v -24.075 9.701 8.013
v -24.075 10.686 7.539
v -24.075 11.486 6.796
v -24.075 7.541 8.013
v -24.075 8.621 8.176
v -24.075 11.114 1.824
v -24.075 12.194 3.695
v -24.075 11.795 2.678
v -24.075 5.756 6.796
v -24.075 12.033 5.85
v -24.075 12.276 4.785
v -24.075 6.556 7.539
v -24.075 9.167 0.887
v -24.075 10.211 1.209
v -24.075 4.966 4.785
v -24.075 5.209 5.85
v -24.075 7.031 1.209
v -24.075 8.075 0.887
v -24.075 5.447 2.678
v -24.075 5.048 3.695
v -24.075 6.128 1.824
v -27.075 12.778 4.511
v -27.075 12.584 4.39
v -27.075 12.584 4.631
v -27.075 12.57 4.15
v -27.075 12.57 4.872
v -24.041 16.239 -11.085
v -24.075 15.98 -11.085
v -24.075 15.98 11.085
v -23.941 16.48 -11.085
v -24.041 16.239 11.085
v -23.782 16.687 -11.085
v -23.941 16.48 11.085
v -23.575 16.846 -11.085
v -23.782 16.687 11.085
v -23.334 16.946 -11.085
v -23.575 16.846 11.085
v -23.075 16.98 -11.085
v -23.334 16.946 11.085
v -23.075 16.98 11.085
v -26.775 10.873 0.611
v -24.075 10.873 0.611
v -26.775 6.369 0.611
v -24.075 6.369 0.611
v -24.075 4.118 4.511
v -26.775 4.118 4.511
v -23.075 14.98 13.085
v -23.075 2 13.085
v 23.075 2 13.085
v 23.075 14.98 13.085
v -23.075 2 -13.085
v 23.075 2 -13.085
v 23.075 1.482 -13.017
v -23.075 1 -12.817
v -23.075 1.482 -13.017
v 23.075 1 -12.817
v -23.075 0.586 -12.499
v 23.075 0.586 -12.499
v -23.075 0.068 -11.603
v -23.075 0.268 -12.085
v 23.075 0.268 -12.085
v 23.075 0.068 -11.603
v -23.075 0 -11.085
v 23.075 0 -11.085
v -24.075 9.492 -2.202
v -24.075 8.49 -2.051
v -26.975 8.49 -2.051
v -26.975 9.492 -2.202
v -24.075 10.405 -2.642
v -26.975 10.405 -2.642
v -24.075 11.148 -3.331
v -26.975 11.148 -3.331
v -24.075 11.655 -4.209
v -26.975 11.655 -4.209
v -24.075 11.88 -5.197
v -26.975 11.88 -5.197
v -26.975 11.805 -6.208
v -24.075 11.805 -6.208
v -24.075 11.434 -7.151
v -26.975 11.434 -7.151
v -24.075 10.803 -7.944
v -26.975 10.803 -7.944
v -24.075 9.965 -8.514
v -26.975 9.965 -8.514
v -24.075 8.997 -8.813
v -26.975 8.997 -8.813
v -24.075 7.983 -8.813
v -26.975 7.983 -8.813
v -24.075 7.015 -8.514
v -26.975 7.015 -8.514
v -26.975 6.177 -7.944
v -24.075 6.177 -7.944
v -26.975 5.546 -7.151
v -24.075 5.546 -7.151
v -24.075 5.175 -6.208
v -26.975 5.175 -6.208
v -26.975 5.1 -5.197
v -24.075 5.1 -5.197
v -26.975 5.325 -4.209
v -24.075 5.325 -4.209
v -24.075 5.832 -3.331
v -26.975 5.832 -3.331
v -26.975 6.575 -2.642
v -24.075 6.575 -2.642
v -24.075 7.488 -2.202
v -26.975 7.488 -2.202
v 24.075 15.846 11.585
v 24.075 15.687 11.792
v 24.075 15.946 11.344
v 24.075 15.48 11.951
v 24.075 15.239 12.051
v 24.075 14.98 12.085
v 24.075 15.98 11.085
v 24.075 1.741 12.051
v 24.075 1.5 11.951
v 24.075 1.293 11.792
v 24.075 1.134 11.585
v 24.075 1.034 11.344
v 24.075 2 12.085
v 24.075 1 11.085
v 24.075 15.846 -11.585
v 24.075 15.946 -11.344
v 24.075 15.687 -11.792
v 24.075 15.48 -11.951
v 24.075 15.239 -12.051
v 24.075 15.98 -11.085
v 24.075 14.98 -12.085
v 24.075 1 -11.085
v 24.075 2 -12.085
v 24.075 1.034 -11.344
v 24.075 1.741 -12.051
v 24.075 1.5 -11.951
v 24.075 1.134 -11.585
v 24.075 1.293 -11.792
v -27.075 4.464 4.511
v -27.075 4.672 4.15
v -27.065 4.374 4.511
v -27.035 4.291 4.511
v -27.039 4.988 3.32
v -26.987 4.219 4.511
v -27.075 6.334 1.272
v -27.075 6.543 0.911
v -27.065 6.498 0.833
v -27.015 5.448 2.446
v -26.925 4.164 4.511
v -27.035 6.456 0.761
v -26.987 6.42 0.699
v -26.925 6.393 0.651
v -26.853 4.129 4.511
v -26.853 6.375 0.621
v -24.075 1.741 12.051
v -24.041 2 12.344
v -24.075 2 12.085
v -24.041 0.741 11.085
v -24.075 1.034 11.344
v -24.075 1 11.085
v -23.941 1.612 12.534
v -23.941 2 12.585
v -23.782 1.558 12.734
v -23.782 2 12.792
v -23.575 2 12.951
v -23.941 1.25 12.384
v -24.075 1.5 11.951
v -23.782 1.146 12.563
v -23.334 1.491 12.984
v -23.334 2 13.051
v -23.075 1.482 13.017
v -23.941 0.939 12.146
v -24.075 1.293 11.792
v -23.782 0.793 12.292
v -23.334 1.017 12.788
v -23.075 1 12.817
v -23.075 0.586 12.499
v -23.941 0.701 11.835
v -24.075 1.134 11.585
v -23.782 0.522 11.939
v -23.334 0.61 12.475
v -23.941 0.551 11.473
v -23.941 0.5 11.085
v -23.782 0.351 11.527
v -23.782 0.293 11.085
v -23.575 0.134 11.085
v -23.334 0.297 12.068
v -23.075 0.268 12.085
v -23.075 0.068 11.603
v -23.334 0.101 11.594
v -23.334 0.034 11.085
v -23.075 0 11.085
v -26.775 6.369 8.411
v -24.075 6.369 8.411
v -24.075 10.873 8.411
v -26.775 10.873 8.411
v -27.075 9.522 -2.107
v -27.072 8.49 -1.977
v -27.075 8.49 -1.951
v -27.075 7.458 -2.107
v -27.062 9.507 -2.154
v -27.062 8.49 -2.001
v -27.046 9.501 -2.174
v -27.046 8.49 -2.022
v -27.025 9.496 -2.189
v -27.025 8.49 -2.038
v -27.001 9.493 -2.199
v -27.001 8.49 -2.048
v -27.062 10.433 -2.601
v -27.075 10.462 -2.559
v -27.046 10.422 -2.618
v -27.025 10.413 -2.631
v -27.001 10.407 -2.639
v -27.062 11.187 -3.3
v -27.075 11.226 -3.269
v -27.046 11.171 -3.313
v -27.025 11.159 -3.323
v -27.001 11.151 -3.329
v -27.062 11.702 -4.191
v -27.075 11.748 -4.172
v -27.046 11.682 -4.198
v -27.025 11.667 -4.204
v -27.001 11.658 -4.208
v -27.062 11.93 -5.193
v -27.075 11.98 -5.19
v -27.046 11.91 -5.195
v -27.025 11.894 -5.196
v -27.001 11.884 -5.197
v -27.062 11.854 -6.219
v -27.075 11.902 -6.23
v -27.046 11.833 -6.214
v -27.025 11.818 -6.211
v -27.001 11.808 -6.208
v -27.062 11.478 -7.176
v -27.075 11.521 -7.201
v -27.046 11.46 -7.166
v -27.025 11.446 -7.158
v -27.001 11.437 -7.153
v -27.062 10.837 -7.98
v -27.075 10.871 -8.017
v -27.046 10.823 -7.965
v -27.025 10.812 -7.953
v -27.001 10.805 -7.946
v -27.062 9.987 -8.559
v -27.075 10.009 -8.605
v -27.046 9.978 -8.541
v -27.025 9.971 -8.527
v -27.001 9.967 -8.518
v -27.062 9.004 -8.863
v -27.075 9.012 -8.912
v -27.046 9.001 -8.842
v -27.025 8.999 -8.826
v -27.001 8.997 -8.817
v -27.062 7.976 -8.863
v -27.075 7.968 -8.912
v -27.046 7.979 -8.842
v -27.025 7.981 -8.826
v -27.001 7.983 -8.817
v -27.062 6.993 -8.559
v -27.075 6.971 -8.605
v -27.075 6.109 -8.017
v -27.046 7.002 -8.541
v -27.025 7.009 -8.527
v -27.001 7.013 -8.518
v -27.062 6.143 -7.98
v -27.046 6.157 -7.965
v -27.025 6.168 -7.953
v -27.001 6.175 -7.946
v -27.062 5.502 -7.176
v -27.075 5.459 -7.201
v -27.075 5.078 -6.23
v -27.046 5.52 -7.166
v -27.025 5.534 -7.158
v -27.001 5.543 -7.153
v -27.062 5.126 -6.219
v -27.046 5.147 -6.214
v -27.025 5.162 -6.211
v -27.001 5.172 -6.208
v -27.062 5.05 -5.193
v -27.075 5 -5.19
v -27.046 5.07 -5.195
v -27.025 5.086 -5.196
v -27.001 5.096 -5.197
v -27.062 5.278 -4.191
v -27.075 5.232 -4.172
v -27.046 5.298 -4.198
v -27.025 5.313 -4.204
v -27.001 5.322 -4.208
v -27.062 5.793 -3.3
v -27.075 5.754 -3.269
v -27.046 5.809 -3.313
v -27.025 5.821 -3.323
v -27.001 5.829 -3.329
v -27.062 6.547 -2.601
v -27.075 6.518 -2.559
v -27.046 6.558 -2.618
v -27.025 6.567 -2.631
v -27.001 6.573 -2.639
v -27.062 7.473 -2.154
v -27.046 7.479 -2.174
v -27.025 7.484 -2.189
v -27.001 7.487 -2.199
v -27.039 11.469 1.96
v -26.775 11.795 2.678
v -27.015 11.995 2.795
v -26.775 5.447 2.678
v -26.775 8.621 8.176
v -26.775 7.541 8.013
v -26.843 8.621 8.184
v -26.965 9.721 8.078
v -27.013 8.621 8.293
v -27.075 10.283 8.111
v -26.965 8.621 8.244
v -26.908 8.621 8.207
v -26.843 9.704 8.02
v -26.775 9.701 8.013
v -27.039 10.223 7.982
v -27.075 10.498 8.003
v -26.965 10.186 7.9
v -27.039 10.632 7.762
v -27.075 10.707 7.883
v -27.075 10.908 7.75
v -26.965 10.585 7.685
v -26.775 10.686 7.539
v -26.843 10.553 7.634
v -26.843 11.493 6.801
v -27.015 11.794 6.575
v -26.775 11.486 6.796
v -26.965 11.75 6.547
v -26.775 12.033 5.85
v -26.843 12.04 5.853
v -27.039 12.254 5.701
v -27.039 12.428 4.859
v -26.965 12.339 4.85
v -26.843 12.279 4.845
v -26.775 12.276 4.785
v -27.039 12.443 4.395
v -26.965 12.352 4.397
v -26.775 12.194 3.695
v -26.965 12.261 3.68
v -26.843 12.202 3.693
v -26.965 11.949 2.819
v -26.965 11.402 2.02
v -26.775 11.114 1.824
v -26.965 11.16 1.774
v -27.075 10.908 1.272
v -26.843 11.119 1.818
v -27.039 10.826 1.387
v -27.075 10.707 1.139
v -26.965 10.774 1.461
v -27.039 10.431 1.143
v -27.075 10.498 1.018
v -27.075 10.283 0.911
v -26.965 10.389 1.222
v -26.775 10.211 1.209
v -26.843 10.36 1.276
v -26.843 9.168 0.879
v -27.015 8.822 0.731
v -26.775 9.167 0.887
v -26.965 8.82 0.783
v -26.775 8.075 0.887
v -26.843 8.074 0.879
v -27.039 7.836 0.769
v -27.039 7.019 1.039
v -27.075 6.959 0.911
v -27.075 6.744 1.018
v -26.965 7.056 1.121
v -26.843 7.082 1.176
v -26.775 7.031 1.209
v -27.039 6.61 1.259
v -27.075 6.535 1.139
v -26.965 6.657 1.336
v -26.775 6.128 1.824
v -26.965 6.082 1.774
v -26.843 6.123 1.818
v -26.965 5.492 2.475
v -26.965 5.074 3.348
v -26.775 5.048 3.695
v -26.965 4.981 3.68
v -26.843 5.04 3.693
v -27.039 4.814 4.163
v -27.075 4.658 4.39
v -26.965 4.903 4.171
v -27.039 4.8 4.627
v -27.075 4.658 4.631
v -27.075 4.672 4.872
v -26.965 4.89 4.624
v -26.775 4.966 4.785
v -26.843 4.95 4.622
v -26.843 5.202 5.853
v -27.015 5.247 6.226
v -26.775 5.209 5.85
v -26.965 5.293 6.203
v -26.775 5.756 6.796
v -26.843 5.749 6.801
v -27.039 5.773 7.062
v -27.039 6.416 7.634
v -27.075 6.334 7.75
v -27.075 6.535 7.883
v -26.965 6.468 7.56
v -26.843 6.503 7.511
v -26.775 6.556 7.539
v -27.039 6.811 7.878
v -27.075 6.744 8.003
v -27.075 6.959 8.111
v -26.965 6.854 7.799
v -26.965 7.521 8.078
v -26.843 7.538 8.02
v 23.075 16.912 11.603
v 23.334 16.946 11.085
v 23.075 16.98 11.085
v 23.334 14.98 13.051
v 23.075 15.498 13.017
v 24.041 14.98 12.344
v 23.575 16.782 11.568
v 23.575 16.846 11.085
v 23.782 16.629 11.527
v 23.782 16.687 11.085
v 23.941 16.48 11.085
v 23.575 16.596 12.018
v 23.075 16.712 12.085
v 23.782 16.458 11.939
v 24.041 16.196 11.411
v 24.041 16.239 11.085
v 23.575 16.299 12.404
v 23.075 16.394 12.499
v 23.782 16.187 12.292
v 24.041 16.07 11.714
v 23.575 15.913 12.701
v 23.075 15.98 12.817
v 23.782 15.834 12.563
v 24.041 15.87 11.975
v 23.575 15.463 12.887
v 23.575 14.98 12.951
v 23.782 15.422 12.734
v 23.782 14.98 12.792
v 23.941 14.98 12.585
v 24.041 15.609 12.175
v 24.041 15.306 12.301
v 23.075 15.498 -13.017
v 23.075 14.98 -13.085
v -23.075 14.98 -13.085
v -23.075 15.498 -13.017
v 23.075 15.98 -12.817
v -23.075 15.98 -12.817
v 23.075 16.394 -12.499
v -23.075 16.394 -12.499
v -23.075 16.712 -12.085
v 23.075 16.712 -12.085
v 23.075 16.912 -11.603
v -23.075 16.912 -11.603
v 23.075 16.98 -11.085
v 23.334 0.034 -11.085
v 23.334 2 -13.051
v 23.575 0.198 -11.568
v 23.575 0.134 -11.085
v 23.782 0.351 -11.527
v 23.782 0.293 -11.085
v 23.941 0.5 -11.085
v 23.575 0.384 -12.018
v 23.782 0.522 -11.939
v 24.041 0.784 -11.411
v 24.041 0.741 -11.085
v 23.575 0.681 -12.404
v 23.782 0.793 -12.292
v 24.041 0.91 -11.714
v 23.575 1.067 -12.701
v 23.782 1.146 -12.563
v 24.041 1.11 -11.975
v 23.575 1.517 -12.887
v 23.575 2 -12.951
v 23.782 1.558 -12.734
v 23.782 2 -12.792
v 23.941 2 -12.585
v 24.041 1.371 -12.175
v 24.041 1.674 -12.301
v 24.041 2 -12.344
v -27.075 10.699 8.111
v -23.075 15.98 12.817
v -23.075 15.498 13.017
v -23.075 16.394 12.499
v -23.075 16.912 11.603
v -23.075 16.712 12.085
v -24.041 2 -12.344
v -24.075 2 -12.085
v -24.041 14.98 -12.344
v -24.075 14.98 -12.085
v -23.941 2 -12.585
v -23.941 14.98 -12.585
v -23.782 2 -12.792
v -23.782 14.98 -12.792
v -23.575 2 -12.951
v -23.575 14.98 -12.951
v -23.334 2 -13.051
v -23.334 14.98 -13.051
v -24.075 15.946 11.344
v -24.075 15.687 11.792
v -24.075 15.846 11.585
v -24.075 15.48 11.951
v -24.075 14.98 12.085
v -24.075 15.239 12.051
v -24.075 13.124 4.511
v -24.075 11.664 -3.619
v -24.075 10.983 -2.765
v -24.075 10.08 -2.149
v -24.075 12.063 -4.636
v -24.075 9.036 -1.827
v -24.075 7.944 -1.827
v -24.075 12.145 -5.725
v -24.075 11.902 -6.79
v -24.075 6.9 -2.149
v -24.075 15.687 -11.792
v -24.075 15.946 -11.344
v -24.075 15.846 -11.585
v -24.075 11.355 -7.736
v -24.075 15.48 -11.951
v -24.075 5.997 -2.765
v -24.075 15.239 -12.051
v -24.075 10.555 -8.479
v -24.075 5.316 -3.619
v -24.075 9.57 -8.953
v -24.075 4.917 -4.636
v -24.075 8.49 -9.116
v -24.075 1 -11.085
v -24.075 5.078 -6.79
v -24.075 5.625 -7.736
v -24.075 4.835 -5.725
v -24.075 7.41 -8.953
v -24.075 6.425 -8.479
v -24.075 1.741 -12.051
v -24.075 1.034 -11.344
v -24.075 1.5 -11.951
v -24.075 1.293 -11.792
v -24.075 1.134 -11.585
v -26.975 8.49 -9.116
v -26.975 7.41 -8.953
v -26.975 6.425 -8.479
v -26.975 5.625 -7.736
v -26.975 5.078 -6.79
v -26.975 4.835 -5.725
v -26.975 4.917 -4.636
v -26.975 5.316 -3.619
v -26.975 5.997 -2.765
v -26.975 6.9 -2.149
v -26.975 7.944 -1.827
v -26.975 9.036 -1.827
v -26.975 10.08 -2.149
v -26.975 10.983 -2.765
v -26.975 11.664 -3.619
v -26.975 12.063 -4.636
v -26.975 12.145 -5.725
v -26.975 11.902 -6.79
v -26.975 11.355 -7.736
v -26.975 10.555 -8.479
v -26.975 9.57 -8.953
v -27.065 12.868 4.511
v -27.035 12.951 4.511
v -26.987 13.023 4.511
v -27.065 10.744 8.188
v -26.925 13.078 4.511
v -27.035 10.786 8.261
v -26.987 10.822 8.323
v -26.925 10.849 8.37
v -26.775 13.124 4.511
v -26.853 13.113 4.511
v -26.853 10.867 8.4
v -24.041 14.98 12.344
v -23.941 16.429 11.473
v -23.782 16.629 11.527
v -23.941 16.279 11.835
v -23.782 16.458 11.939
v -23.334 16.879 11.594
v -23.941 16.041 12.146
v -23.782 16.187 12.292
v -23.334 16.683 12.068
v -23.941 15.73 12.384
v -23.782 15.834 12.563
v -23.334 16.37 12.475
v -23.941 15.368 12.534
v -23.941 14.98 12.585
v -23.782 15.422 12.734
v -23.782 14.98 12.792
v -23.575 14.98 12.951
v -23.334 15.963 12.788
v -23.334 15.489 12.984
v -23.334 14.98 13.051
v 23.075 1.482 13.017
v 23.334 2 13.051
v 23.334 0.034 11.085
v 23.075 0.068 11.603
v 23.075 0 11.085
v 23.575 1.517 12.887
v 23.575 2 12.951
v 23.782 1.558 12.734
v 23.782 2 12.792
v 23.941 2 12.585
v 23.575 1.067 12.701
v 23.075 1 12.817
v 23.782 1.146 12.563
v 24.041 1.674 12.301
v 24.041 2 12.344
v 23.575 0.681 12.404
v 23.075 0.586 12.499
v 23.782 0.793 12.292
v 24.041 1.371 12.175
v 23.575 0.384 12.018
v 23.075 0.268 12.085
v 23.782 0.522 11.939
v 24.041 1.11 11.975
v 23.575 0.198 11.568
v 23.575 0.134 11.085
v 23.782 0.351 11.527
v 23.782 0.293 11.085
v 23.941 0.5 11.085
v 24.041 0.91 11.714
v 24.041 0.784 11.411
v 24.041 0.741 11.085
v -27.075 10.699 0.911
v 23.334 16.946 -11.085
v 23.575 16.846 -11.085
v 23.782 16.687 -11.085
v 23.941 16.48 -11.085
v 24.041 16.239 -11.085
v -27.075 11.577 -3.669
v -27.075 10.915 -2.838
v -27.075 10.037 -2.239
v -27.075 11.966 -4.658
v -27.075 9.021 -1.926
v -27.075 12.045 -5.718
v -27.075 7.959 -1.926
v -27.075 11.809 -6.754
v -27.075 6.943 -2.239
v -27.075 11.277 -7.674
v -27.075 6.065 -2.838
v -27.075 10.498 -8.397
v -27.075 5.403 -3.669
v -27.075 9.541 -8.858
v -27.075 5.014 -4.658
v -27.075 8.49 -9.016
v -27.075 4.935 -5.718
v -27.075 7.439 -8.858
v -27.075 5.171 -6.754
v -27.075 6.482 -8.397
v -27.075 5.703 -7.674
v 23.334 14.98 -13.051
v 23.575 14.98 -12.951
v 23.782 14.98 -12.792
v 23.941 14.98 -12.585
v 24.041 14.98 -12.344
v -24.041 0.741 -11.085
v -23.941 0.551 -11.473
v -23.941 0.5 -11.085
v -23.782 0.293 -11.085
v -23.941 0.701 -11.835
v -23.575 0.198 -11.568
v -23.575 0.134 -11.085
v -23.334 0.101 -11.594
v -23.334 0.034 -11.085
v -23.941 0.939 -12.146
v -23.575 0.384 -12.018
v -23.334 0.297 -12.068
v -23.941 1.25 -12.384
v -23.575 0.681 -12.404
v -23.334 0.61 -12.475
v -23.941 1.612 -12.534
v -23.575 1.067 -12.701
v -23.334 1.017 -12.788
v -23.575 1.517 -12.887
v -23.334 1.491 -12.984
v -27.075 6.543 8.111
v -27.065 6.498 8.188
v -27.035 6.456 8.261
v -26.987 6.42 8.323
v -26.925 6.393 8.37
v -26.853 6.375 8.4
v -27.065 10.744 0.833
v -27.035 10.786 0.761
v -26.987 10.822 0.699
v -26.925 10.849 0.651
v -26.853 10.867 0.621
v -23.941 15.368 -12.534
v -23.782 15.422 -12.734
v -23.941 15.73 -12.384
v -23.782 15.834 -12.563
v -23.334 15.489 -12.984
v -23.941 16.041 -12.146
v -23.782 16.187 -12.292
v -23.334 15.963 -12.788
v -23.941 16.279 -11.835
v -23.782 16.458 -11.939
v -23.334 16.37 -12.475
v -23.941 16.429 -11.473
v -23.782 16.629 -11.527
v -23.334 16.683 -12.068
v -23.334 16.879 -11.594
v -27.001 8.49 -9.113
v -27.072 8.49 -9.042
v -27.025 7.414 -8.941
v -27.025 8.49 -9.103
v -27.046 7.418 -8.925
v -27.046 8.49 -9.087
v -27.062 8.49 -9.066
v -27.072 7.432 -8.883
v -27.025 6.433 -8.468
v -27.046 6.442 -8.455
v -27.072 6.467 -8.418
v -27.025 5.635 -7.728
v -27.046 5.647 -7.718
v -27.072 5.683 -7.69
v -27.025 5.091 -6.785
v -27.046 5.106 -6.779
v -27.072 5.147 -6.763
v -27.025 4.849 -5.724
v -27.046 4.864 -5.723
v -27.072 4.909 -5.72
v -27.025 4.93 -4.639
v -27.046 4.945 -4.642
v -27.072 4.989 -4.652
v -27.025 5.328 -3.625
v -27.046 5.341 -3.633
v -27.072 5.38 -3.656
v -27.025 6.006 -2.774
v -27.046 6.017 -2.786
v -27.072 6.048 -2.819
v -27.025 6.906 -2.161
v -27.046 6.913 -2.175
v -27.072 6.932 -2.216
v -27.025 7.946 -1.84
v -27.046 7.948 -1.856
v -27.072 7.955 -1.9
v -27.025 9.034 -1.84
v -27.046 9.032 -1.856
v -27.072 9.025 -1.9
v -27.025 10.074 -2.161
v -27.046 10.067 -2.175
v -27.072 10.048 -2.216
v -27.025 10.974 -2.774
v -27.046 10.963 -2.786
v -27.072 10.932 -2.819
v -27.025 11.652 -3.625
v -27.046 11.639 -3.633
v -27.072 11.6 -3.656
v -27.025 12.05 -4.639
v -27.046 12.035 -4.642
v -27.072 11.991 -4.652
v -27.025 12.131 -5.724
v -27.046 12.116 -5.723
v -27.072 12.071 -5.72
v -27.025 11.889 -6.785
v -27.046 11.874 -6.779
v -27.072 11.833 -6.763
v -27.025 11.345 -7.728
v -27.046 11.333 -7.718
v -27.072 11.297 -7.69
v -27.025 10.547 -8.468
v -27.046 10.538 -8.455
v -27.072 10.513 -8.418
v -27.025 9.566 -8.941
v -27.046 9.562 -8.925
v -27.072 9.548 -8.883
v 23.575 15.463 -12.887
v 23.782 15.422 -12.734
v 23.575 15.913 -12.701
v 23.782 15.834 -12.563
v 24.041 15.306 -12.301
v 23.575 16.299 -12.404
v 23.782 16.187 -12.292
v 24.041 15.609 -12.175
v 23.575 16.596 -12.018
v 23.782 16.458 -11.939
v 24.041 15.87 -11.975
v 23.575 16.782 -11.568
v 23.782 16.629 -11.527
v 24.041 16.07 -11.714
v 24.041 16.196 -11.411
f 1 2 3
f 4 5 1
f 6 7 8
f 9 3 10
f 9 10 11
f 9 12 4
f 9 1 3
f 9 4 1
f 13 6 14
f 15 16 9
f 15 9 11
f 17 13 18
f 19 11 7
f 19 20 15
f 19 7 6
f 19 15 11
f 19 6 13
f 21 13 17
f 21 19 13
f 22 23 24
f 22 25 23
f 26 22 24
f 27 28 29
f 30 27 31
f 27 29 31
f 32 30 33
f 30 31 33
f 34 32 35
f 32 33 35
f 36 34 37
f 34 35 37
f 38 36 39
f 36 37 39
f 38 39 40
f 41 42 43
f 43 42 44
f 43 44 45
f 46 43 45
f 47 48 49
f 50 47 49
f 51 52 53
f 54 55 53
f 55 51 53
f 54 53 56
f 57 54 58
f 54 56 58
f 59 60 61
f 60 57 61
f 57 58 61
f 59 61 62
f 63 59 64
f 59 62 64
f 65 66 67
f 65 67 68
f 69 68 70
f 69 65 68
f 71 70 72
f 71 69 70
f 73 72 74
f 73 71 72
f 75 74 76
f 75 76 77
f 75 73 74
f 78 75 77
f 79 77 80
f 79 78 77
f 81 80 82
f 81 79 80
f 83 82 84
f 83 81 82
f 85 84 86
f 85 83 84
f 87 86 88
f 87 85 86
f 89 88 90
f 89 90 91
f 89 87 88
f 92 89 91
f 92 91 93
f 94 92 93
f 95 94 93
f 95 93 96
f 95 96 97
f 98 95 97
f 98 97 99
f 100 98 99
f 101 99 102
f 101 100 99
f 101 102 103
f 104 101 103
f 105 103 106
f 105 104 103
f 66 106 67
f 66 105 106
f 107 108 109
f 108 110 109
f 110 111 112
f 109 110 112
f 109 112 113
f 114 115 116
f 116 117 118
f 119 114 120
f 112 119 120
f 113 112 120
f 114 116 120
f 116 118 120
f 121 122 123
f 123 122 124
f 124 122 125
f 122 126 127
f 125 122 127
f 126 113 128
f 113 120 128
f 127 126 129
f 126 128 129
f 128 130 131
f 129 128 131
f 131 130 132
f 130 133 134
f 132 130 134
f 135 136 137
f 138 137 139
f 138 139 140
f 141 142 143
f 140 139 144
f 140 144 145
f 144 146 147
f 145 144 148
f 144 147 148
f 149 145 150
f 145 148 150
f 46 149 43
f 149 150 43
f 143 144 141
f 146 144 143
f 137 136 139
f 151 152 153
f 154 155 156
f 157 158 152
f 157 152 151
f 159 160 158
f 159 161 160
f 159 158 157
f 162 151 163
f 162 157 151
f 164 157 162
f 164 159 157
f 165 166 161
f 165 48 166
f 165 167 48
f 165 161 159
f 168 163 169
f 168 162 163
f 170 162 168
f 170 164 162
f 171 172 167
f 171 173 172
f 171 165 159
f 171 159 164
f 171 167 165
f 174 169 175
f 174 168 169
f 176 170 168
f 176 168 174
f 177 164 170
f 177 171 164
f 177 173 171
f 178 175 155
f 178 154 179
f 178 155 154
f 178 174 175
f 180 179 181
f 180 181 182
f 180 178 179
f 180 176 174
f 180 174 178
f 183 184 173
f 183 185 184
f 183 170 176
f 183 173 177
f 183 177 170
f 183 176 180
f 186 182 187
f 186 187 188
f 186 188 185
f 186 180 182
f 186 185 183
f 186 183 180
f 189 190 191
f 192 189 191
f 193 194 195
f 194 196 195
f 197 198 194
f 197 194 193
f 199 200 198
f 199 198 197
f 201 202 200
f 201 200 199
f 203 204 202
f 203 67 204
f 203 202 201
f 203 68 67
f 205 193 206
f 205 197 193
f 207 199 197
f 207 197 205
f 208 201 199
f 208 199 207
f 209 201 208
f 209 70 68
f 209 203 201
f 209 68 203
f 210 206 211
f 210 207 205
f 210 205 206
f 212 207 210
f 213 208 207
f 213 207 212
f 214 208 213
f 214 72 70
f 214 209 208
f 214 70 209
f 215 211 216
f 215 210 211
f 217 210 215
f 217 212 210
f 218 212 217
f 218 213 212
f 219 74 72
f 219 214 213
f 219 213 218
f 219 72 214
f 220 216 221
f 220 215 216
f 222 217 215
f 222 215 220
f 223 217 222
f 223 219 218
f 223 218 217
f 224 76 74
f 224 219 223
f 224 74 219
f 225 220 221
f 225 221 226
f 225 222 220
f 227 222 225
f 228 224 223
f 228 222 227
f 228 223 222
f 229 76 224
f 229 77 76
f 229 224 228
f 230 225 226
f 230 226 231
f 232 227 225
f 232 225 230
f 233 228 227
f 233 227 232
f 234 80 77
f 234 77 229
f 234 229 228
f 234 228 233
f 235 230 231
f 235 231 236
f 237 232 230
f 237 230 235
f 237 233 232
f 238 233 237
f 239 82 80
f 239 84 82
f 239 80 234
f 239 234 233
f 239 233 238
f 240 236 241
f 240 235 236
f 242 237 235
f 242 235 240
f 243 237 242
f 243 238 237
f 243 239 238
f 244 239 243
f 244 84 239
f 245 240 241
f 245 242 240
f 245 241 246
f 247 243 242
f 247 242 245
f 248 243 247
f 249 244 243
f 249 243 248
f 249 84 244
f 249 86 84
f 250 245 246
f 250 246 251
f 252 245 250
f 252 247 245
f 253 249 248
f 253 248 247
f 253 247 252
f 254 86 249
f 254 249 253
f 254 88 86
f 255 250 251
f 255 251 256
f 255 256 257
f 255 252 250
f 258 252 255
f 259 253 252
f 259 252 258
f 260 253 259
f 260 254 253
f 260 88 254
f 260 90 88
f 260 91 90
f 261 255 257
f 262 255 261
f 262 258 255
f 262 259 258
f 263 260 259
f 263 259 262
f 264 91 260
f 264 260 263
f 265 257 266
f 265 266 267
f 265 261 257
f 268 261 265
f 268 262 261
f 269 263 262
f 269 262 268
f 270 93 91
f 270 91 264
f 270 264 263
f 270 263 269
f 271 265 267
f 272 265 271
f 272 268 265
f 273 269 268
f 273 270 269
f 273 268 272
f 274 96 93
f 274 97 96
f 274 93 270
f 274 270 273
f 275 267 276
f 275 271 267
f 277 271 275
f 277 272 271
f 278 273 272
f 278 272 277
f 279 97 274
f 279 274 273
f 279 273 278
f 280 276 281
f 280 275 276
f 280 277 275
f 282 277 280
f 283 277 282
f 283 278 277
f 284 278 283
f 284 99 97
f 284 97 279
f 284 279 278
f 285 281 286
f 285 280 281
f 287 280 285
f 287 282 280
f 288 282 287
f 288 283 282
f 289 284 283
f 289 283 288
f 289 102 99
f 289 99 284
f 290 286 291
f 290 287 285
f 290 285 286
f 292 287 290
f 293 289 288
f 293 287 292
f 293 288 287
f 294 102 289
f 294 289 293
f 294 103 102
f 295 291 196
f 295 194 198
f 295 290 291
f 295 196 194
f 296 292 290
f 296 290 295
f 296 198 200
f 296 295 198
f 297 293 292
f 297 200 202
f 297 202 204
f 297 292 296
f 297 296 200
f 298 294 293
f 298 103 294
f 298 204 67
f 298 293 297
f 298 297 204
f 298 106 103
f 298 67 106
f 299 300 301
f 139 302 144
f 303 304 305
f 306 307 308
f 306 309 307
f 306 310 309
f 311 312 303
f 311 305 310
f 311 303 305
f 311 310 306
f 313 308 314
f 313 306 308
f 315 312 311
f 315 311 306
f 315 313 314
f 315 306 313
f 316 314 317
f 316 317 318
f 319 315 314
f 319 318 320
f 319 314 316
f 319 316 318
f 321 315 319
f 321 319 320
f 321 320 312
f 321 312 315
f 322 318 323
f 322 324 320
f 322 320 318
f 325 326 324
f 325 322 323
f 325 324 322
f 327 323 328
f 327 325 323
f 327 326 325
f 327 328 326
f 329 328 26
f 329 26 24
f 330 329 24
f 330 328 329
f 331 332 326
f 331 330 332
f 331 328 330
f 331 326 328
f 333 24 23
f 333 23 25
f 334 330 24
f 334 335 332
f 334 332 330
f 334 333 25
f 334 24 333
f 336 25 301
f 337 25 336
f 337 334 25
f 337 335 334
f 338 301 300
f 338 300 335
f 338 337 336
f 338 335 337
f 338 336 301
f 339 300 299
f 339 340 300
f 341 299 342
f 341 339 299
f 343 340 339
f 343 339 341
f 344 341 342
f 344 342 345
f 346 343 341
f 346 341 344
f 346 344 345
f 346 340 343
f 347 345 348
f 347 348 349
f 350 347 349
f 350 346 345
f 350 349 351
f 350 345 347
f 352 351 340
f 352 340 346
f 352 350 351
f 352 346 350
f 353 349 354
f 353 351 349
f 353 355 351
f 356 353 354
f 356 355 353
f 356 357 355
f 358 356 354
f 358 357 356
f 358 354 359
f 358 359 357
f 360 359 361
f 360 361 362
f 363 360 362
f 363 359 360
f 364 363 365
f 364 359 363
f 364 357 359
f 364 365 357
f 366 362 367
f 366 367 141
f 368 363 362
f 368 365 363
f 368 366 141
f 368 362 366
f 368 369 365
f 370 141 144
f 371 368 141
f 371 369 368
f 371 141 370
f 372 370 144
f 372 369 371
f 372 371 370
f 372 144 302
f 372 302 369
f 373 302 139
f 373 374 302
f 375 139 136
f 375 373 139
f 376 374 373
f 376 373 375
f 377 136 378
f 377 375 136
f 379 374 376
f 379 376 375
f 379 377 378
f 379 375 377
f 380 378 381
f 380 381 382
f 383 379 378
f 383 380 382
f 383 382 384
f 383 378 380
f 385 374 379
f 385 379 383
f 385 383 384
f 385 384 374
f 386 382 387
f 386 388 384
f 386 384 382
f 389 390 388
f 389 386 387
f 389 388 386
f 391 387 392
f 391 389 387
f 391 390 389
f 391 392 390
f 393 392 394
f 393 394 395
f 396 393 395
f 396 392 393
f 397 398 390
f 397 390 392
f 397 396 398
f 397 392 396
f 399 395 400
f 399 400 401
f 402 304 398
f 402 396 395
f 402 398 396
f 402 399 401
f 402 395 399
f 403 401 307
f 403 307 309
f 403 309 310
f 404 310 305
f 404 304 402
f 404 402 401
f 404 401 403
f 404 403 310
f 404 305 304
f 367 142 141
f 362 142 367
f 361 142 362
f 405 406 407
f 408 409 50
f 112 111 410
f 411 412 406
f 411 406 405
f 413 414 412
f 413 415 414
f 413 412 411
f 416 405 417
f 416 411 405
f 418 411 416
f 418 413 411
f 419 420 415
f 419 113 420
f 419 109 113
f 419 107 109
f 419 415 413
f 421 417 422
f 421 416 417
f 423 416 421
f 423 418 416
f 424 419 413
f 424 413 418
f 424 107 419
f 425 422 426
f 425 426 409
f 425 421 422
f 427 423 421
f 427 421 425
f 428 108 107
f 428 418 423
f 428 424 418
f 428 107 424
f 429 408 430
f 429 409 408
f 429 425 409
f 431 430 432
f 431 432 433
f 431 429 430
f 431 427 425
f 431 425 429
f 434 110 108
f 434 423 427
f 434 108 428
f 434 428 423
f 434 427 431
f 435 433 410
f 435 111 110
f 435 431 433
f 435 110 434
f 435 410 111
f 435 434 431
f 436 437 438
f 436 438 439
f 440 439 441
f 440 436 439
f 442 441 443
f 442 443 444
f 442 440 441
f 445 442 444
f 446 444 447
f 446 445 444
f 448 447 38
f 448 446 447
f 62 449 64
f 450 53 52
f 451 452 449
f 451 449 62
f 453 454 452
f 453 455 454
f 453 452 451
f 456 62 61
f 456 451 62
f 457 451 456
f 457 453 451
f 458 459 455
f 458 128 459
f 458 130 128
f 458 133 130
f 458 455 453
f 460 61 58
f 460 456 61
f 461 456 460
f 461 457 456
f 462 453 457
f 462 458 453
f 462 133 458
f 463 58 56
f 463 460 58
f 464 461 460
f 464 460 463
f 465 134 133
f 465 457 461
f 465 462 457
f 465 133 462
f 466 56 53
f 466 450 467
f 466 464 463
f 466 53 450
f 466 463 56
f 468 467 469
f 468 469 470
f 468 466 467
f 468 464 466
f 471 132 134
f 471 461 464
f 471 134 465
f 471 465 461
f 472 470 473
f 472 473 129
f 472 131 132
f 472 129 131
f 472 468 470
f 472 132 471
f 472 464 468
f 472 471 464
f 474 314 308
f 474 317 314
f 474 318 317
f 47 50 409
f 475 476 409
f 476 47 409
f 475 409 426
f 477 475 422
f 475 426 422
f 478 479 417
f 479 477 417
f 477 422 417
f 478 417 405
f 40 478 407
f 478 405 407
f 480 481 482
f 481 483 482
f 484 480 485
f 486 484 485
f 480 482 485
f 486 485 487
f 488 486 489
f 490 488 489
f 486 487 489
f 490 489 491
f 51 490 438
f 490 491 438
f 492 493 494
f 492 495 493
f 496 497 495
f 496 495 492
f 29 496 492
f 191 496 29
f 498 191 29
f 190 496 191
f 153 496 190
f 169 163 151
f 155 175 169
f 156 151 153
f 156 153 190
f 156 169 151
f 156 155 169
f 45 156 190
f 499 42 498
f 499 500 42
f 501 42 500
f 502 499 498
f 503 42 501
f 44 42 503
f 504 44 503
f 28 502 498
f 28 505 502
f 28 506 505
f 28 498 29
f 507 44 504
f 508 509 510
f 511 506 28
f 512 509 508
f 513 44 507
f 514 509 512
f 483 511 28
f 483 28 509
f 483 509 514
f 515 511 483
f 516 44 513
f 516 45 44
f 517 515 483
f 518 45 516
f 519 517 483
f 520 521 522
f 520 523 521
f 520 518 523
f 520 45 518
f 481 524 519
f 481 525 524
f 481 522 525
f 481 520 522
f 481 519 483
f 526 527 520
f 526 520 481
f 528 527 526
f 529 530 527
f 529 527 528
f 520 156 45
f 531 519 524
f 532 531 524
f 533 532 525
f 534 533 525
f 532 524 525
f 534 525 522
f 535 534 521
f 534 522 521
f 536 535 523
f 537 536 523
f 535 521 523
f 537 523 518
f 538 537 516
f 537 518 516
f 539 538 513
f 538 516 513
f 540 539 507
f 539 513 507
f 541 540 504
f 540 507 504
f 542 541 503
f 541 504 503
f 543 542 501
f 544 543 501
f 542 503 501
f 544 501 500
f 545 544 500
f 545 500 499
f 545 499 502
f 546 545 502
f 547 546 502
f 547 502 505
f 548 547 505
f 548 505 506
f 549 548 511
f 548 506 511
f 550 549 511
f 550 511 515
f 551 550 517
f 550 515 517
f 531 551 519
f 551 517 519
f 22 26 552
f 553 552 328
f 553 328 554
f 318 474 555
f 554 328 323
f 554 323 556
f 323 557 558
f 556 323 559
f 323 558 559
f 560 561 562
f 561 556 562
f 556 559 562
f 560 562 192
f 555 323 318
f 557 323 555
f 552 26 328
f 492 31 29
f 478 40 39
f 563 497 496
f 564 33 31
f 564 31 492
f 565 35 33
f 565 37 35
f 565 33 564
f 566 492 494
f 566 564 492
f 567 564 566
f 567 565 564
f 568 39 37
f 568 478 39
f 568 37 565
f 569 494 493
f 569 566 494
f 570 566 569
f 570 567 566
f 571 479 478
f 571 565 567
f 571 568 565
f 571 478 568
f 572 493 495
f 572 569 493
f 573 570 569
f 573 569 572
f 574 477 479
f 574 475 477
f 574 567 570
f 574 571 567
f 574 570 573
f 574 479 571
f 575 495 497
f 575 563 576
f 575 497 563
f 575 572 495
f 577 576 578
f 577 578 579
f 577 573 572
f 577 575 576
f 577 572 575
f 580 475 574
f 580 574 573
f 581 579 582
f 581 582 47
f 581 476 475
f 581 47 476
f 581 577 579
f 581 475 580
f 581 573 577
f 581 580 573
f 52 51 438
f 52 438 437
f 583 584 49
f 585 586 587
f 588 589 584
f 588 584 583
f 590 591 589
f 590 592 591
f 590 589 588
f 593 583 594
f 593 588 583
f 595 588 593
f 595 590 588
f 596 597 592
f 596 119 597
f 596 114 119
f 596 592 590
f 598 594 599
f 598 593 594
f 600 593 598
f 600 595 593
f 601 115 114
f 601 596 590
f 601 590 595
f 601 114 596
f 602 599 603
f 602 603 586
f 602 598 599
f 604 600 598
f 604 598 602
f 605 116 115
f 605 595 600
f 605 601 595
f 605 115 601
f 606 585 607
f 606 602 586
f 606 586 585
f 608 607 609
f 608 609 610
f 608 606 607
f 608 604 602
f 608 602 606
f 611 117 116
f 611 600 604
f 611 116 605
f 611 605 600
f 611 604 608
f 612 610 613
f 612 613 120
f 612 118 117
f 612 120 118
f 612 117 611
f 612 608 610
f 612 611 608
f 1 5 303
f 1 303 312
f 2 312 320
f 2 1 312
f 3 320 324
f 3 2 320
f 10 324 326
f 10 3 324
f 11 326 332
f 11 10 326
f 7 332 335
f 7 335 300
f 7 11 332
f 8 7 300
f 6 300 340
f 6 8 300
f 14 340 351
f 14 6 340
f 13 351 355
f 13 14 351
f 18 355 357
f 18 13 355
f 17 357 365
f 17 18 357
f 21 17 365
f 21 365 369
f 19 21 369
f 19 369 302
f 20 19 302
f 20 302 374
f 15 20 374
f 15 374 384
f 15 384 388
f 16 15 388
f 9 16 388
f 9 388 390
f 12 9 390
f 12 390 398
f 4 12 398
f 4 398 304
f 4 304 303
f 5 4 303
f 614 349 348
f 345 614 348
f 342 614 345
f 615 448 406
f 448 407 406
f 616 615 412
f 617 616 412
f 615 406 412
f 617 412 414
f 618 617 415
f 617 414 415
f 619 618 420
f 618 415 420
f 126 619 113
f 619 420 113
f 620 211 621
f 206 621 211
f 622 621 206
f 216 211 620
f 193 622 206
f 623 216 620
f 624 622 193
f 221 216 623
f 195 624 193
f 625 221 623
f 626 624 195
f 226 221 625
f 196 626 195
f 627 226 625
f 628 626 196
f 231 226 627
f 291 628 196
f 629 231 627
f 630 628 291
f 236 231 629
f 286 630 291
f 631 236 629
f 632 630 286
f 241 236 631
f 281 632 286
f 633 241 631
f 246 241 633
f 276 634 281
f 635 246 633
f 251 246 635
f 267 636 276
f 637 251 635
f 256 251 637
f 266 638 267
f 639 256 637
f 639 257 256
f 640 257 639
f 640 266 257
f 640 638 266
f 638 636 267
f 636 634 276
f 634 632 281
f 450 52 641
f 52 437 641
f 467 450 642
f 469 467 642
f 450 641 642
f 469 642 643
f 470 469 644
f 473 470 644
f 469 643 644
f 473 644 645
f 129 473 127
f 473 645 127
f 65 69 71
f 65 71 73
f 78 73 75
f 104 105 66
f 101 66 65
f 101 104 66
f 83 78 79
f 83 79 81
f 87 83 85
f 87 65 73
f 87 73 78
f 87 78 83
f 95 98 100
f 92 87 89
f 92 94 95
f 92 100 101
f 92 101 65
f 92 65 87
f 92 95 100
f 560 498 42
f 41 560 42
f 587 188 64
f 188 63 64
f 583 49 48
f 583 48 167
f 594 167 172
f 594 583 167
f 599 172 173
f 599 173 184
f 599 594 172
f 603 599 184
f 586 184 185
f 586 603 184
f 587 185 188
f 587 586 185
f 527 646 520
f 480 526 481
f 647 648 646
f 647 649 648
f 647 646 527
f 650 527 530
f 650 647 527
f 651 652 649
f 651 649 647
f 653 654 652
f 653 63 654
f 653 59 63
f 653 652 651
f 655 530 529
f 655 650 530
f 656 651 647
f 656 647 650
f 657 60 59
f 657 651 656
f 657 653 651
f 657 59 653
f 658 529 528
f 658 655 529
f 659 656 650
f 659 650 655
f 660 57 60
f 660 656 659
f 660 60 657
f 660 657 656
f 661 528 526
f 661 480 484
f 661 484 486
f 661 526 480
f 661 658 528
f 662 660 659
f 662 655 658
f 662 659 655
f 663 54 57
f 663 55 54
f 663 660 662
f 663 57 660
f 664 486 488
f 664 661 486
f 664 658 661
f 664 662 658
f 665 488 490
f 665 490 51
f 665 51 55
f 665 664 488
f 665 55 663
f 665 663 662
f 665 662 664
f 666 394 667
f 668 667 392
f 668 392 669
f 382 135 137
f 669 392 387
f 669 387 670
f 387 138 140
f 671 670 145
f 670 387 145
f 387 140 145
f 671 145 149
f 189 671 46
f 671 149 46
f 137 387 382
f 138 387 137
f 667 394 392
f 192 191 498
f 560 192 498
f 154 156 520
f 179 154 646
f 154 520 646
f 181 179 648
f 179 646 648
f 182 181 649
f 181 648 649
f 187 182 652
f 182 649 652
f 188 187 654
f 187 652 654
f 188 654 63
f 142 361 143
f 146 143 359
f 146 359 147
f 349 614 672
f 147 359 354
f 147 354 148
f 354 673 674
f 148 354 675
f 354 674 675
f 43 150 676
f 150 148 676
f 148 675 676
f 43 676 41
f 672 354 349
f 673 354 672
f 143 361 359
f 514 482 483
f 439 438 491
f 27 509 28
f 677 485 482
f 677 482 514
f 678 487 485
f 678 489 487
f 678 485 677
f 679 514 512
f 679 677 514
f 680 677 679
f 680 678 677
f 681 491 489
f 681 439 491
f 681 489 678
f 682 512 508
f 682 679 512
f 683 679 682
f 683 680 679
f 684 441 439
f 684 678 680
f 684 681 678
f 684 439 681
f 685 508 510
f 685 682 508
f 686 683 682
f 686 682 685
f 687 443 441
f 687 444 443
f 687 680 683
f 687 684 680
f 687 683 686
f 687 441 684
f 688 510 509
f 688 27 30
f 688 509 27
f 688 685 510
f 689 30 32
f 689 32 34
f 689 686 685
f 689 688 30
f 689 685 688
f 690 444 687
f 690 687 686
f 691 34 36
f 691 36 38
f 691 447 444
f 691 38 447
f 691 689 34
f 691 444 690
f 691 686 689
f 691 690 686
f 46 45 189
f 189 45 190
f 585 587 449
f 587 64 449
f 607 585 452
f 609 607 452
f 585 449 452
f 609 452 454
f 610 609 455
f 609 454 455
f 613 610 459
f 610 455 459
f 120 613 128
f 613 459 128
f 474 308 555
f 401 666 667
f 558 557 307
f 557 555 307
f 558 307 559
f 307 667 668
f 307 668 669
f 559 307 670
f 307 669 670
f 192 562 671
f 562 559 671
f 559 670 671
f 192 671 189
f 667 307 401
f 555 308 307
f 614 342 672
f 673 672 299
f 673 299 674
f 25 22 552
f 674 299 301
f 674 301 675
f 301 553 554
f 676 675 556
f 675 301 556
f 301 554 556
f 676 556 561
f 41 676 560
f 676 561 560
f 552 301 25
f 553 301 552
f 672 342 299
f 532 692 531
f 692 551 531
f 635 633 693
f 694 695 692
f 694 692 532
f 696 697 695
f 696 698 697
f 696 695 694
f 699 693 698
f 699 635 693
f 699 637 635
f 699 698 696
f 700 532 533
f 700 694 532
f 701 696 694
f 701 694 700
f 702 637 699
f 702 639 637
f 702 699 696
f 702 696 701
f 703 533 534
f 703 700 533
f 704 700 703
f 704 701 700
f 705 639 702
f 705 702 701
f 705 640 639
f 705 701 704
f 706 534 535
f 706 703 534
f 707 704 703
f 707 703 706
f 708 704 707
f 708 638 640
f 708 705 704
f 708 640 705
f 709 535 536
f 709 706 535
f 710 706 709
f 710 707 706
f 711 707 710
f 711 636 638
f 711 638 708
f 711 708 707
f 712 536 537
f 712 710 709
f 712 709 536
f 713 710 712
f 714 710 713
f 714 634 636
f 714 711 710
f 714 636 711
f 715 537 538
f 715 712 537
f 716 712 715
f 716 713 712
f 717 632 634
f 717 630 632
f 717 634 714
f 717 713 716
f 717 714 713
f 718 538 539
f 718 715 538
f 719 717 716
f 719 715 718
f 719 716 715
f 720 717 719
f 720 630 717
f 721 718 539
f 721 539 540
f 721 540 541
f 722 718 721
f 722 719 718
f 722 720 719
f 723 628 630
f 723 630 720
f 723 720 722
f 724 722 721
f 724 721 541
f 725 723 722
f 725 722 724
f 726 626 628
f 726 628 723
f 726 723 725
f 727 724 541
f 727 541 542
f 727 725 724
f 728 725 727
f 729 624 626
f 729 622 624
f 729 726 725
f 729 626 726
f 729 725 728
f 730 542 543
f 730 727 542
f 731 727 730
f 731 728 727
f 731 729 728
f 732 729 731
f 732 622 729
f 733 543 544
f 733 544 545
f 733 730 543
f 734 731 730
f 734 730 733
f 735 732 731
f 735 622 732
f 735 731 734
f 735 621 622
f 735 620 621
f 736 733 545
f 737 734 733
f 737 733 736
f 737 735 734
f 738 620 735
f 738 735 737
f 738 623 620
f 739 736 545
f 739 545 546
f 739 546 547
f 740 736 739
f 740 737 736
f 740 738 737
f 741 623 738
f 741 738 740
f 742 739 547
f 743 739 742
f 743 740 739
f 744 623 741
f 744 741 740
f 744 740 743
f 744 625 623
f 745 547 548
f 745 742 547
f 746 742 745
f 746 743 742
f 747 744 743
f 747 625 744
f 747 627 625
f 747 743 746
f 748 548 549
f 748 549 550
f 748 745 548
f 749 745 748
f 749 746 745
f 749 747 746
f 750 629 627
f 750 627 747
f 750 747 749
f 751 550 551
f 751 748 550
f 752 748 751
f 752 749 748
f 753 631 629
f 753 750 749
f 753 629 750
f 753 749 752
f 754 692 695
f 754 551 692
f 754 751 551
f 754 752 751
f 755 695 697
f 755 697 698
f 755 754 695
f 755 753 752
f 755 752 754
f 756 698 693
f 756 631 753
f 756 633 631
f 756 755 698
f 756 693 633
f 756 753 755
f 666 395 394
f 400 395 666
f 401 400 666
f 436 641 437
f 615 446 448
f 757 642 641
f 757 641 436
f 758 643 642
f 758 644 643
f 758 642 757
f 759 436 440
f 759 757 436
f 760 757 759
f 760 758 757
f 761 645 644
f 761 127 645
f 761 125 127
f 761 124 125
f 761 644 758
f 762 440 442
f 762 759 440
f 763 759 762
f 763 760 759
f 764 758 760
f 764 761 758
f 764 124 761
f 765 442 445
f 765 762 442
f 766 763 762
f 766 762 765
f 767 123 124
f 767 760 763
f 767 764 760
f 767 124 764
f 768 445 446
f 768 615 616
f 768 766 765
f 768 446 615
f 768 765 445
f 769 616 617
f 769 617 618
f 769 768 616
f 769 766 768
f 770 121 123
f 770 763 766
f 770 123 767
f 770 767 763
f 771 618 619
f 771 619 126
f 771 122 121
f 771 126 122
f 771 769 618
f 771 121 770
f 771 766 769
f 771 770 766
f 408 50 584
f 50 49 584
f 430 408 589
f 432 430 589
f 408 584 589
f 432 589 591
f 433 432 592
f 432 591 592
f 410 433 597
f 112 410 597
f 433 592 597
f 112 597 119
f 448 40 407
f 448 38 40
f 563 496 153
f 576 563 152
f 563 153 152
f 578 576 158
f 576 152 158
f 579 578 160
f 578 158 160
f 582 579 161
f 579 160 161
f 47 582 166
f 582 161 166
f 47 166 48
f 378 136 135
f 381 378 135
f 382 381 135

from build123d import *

# Parameters (mm, degrees)
SKETCH1_W           = 48.15
SKETCH1_H           = 26.17
BOSS_EXTRUDE1_DEPTH = 16.98
FILLET1_R           = 2
FILLET2_R           = 1
SKETCH2_R           = 3.665
SKETCH2_R_2         = 3.4
BOSS_EXTRUDE2_DEPTH = 3
FILLET6_R           = 0.3
FILLET10_R          = 0.1


with BuildPart() as part:
    # Sketch1 → Boss-Extrude1 (new body)
    with BuildSketch(Plane(origin=(0, 0, 0), x_dir=(1, 0, 0), z_dir=(0, 1, 0))):
        Rectangle(SKETCH1_W, SKETCH1_H)
    extrude(amount=BOSS_EXTRUDE1_DEPTH)

    # Fillet1
    fillet1_edges = [part.edges().sort_by_distance(p)[0] for p in [
        (0, 16.98, -13.085),
        (0, 0, -13.085),
        (0, 0, 13.085),
        (0, 16.98, 13.085),
    ]]
    fillet(fillet1_edges, radius=FILLET1_R)

    # Fillet2
    fillet2_edges = [part.edges().sort_by_distance(p)[0] for p in [
        (-24.075, 8.49, -13.085),
        (24.075, 8.49, -13.085),
        (-24.075, 0, 0),
        (-24.075, 8.49, 13.085),
        (-24.075, 16.98, 0),
        (-24.075, 16.394213562, 12.499213562),
        (-24.075, 16.394213562, -12.499213562),
        (-24.075, 0.585786438, 12.499213562),
        (-24.075, 0.585786438, -12.499213562),
        (24.075, 0, 0),
        (24.075, 16.98, 0),
        (24.075, 8.49, 13.085),
        (24.075, 16.394213562, 12.499213562),
        (24.075, 16.394213562, -12.499213562),
        (24.075, 0.585786438, 12.499213562),
        (24.075, 0.585786438, -12.499213562),
    ]]
    fillet(fillet2_edges, radius=FILLET2_R)

    # Sketch2 → Boss-Extrude2 (add)
    # profile 1 of 2: a face of its own
    with BuildSketch(Plane.ZY.offset(24.075)):
        with Locations(Location((-5.451156858, 8.49, 0), (0, 0, 180))):
            Circle(SKETCH2_R)
        with Locations((-5.451156858, 8.49)):
            Circle(SKETCH2_R_2, mode=Mode.SUBTRACT)
    # profile 2 of 2: a face of its own
    with BuildSketch(Plane.ZY.offset(24.075)):
        Polygon((4.510660825, 13.124360065), (0.610660825, 10.872694015), (0.610660825, 6.369361915), (4.510660825, 4.117695866), (8.410660825, 6.369361915), (8.410660825, 10.872694015), align=None)
        with Locations((4.510660825, 8.621027965)):
            Circle(SKETCH2_R, mode=Mode.SUBTRACT)
    extrude(amount=BOSS_EXTRUDE2_DEPTH)

    # Fillet6
    # the kernel refuses this fillet: 0.3 mm, written as the material it takes off along each edge
    with BuildSketch(Plane(origin=(-27.075, 8.621027965, 4.510660825), x_dir=(0, 0, 1), z_dir=(0, -1, 0))) as fillet6_piece_1:
        with BuildLine():
            CenterArc((3.665 + FILLET6_R, -FILLET6_R), FILLET6_R, 90, 90)
            Line((3.665, -FILLET6_R), (3.665, 0))
            Line((3.665, 0), (3.665 + FILLET6_R, 0))
        make_face()
    revolve(axis=Axis((-27.075, 8.621027965, 4.510660825), (-1, 0, 0)), mode=Mode.SUBTRACT)
    with BuildSketch(Plane(origin=(-27.075, 10.497694015, 9.060179878), x_dir=(1, 0, 0), z_dir=(0, 0.5000000000000002, -0.8660254037844386)), Plane(origin=(-27.075, 13.499360065, 5.160179878), x_dir=(1, 0, 0), z_dir=(0, -0.5000000000000002, -0.8660254037844386)), Plane(origin=(-27.075, 11.622694015, 0.610660825), x_dir=(1, 0, 0), z_dir=(0, -1, 0)), Plane(origin=(-27.075, 6.744361915, -0.038858228), x_dir=(1, 0, 0), z_dir=(0, -0.5000000000000002, 0.8660254037844386)), Plane(origin=(-27.075, 3.742695866, 3.861141772), x_dir=(1, 0, 0), z_dir=(0, 0.49999999999999983, 0.8660254037844388)), Plane(origin=(-27.075, 5.619361915, 8.410660825), x_dir=(1, 0, 0), z_dir=(0, 1, 0))) as fillet6_piece_2:
        with BuildLine():
            CenterArc((FILLET6_R, FILLET6_R), FILLET6_R, 180, 90)
            Line((0, FILLET6_R), (0, 0))
            Line((0, 0), (FILLET6_R, 0))
        make_face()
    extrude(amount=6.0033321, mode=Mode.SUBTRACT)

    # Fillet10
    fillet10_edges = [part.edges().sort_by_distance(p)[0] for p in [
        (-27.075, 8.49, -1.786156858),
        (-27.075, 8.49, -8.851156858),
    ]]
    fillet(fillet10_edges, radius=FILLET10_R)


solid = part.part
